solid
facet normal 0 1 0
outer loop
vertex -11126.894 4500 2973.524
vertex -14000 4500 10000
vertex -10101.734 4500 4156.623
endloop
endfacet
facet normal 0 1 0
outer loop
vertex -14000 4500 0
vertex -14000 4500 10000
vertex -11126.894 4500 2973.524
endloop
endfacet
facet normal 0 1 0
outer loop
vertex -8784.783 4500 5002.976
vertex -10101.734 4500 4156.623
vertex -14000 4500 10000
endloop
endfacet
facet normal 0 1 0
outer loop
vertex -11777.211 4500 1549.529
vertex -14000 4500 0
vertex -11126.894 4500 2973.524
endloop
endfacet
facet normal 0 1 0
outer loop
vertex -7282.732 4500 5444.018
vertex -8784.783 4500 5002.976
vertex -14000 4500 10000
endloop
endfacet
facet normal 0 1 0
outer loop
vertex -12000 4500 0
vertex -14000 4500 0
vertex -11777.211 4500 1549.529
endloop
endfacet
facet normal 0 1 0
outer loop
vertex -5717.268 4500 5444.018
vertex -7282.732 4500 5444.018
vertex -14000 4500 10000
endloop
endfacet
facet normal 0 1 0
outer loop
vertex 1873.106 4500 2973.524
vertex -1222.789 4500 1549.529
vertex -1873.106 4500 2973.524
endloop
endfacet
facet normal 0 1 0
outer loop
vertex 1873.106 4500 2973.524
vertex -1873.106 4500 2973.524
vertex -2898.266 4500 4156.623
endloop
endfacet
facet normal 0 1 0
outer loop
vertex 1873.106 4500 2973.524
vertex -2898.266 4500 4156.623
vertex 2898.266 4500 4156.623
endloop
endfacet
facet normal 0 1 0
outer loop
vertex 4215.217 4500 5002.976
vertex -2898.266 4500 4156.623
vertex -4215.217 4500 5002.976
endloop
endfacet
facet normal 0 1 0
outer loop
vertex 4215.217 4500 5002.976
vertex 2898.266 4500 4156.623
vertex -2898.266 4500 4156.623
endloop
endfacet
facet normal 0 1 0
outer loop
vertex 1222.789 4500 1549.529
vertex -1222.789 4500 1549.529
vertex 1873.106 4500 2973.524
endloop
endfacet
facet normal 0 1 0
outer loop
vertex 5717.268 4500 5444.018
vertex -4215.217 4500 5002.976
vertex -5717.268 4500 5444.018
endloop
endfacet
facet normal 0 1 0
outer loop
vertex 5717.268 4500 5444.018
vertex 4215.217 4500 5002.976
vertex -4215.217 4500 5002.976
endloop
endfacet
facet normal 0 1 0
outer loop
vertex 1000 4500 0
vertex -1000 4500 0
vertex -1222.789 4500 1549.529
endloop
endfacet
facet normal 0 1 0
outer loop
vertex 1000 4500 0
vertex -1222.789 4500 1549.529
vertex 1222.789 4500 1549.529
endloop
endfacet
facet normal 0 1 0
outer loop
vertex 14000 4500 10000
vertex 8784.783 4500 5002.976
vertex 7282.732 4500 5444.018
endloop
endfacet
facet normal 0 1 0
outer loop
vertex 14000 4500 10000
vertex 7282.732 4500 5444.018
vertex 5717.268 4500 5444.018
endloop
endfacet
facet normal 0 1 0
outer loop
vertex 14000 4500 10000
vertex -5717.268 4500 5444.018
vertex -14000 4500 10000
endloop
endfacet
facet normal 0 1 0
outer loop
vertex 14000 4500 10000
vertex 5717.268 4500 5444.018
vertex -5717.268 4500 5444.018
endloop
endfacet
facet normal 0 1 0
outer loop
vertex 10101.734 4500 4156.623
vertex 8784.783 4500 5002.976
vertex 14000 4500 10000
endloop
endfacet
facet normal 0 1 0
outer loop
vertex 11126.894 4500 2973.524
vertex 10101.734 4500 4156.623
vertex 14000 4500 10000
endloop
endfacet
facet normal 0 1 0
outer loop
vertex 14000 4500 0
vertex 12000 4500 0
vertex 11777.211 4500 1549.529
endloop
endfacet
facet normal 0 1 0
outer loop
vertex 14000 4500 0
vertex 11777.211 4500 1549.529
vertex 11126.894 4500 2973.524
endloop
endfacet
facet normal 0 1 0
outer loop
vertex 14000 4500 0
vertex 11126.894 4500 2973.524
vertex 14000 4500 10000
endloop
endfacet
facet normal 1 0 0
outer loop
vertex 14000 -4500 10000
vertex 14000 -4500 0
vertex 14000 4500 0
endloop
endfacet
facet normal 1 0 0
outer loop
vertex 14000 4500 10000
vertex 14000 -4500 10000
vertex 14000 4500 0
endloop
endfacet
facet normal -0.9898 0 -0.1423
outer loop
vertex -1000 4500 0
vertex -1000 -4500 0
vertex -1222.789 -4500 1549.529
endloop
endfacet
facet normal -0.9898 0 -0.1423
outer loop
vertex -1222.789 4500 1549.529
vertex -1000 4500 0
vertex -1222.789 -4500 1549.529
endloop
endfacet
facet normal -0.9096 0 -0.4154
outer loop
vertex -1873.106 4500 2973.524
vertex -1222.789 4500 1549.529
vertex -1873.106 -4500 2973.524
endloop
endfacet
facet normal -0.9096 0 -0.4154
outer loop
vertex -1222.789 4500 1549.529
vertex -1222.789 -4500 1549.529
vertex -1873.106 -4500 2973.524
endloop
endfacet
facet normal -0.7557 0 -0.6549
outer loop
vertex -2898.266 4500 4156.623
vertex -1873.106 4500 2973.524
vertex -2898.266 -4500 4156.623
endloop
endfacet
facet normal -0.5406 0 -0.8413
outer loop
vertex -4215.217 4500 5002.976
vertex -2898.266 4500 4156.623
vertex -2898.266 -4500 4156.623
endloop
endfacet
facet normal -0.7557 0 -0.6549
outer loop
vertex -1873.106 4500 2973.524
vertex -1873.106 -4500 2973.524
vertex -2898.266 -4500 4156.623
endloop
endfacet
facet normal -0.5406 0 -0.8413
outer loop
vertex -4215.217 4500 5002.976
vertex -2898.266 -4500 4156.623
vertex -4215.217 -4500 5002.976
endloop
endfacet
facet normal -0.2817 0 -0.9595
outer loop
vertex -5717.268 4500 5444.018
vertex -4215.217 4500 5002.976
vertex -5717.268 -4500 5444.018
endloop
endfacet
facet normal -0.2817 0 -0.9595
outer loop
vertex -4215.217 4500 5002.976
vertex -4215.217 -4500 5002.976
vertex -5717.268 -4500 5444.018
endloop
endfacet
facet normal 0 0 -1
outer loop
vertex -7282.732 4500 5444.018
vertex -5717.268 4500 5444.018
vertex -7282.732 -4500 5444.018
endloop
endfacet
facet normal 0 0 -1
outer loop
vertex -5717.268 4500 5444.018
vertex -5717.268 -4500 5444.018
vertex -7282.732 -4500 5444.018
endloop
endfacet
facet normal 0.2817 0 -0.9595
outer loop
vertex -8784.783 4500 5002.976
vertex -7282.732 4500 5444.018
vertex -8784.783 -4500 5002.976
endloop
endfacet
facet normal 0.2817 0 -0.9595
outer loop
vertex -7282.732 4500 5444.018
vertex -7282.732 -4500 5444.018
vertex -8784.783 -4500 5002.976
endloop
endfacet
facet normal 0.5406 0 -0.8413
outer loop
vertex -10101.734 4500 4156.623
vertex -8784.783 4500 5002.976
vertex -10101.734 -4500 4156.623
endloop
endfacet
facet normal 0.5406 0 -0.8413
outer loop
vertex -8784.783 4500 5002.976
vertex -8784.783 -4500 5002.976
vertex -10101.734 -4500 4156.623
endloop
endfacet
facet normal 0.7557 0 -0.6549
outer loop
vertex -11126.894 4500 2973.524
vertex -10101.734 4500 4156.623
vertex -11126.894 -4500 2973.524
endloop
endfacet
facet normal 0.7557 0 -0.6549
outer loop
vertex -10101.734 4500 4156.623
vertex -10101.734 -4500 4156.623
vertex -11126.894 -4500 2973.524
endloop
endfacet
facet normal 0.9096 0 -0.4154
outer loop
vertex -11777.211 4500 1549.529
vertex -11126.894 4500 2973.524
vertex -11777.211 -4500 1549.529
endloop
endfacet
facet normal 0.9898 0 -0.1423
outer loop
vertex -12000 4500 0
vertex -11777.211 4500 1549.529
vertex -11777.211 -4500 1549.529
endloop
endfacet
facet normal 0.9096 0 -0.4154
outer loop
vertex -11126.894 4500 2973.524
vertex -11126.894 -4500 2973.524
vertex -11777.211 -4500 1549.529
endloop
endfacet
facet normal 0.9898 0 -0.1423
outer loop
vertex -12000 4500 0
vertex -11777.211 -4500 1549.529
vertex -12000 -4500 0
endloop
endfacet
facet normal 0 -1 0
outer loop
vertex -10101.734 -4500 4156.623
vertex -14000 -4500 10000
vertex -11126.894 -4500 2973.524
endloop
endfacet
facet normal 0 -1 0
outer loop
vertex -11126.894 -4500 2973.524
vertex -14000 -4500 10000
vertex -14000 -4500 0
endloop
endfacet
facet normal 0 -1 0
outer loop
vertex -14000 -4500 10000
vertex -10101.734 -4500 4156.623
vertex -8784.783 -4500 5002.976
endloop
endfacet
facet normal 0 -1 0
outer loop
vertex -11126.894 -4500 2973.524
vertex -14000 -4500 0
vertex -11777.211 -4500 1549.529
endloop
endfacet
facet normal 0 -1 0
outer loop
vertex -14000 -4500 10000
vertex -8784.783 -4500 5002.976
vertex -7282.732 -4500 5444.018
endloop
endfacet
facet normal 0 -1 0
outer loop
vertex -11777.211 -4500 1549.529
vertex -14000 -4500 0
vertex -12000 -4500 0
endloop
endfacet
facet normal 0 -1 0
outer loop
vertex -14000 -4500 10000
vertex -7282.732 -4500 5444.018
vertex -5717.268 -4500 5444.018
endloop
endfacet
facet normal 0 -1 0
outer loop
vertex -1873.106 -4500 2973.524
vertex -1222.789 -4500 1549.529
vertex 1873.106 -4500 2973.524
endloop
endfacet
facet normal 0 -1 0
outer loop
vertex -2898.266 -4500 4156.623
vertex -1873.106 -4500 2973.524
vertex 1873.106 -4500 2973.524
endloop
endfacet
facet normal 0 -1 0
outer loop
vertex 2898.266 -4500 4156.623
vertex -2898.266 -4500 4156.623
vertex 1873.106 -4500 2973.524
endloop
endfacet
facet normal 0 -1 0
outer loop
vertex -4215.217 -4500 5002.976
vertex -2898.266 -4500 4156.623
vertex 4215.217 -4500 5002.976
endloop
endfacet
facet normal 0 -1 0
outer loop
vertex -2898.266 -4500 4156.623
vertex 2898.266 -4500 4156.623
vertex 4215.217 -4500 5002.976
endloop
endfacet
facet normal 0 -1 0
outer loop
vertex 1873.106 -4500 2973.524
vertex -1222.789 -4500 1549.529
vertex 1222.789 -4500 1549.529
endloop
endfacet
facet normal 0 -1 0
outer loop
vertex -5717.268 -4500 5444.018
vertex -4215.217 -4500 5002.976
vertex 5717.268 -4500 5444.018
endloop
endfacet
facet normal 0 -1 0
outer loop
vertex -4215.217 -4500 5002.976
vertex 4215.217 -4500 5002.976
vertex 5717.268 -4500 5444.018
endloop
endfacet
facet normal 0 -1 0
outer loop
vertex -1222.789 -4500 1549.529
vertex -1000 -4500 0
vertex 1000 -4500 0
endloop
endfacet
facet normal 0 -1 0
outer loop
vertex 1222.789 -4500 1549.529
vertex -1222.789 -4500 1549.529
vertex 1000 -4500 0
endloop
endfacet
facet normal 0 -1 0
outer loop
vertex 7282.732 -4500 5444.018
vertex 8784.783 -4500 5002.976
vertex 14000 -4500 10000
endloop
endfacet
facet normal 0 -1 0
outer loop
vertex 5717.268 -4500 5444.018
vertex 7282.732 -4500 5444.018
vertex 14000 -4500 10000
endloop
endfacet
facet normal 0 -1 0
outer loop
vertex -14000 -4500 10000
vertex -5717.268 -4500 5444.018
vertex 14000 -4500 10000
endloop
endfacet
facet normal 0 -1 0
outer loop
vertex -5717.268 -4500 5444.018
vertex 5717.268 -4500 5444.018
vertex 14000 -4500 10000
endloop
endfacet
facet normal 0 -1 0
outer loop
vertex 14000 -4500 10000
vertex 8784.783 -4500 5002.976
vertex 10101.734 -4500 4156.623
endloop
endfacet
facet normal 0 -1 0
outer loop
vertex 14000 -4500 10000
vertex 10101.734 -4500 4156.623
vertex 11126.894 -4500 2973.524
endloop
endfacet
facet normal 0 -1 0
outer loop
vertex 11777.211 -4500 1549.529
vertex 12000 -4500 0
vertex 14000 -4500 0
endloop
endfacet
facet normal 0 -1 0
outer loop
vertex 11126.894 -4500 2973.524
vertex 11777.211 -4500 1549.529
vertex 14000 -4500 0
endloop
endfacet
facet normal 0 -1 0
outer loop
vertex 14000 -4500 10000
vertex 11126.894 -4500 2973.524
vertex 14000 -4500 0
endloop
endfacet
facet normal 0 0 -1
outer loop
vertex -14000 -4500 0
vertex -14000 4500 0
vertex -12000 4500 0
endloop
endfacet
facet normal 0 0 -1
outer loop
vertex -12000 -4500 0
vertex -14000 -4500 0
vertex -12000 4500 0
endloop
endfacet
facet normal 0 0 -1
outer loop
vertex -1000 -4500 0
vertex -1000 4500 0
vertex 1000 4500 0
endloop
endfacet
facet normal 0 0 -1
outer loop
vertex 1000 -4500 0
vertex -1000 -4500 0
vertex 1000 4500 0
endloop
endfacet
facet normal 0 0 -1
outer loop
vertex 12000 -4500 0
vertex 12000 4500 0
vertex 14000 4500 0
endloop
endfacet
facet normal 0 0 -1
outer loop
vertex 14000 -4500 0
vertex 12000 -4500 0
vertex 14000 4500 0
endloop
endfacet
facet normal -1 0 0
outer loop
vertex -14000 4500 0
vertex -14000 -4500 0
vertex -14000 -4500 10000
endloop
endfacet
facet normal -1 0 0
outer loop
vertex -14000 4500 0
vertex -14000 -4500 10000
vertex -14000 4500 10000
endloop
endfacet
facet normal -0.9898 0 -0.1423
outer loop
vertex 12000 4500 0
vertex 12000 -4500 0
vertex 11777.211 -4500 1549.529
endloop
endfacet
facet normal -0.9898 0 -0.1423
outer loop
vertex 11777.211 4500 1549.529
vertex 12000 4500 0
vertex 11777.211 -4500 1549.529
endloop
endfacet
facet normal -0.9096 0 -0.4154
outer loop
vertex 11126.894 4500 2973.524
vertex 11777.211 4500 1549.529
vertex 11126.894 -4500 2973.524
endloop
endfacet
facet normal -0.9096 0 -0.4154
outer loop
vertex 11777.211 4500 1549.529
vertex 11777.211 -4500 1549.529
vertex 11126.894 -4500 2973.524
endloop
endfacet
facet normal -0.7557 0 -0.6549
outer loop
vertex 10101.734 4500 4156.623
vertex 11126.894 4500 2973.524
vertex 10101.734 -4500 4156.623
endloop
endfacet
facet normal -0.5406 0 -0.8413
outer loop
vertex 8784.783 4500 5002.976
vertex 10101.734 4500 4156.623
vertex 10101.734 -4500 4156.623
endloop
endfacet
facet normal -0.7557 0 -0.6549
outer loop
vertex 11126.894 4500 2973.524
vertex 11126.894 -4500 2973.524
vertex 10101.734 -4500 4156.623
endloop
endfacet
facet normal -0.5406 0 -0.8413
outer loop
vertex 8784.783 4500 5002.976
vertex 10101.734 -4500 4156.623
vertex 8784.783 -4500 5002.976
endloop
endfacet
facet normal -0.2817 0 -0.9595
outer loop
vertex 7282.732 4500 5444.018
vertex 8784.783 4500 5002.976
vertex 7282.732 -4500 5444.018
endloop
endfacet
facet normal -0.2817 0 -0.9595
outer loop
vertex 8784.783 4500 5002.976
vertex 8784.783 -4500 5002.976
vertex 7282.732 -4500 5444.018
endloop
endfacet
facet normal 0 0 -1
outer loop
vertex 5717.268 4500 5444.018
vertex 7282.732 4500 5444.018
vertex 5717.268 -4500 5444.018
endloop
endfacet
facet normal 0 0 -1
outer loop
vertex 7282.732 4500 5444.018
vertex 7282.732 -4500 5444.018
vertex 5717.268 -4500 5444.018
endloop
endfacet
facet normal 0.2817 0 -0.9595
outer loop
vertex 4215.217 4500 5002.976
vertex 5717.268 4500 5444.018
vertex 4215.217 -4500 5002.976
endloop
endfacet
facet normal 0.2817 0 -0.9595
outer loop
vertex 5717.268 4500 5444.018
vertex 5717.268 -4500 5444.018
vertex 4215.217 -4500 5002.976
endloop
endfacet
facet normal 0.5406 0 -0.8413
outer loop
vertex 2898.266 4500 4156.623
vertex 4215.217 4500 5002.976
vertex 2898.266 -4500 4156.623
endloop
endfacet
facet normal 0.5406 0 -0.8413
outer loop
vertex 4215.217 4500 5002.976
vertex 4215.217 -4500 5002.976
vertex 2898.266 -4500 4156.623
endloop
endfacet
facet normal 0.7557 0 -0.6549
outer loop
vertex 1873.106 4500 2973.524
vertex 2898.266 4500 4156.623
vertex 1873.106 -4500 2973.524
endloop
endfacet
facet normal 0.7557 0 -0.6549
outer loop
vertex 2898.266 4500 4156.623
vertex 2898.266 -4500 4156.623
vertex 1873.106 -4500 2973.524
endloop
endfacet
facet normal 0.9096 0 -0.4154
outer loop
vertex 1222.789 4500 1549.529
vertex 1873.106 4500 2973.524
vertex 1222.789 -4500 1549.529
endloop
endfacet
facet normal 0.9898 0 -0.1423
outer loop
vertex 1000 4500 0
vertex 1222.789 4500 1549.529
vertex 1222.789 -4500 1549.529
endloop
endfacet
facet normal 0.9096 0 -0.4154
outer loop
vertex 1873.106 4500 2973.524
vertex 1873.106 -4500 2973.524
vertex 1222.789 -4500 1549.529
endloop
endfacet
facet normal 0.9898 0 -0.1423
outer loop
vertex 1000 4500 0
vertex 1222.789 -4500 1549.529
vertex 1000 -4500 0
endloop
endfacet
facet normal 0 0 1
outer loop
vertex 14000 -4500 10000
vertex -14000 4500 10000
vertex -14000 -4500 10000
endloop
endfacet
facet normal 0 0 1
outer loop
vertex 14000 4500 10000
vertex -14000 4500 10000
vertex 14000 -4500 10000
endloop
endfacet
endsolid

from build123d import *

# Parameters (mm, degrees)
SKETCH1_W           = 28000
SKETCH1_H           = 9000
BOSS_EXTRUDE1_DEPTH = 10000
CUT_EXTRUDE1_REACH  = 19418.488


with BuildPart() as part:
    # Sketch1 → Boss-Extrude1 (new body)
    with BuildSketch(Plane.XY):
        Rectangle(SKETCH1_W, SKETCH1_H)
    extrude(amount=BOSS_EXTRUDE1_DEPTH)

    # Sketch2 → Cut-Extrude1 (cut, up to next)
    with BuildSketch(Plane.XZ.offset(4500), mode=Mode.PRIVATE) as cut_extrude1_sk1:
        with BuildLine():
            Line((-12000, 0), (-1000, 0))
            ThreePointArc((-1000, 0), (-6500, 5500), (-12000, 0))
        make_face()
    cut_extrude1_tool1 = extrude(cut_extrude1_sk1.sketch, amount=-CUT_EXTRUDE1_REACH, mode=Mode.PRIVATE) & part.part
    # Sketch2 → Cut-Extrude1 (cut, up to next)
    with BuildSketch(Plane.XZ.offset(4500), mode=Mode.PRIVATE) as cut_extrude1_sk2:
        with BuildLine():
            Line((1000, 0), (12000, 0))
            ThreePointArc((12000, 0), (6500, 5500), (1000, 0))
        make_face()
    cut_extrude1_tool2 = extrude(cut_extrude1_sk2.sketch, amount=-CUT_EXTRUDE1_REACH, mode=Mode.PRIVATE) & part.part
    add(cut_extrude1_tool1.solids().sort_by_distance((-6500, -4500, 2334.272499))[0], mode=Mode.SUBTRACT)
    add(cut_extrude1_tool2.solids().sort_by_distance((6500, -4500, 2334.272499))[0], mode=Mode.SUBTRACT)


solid = part.part
